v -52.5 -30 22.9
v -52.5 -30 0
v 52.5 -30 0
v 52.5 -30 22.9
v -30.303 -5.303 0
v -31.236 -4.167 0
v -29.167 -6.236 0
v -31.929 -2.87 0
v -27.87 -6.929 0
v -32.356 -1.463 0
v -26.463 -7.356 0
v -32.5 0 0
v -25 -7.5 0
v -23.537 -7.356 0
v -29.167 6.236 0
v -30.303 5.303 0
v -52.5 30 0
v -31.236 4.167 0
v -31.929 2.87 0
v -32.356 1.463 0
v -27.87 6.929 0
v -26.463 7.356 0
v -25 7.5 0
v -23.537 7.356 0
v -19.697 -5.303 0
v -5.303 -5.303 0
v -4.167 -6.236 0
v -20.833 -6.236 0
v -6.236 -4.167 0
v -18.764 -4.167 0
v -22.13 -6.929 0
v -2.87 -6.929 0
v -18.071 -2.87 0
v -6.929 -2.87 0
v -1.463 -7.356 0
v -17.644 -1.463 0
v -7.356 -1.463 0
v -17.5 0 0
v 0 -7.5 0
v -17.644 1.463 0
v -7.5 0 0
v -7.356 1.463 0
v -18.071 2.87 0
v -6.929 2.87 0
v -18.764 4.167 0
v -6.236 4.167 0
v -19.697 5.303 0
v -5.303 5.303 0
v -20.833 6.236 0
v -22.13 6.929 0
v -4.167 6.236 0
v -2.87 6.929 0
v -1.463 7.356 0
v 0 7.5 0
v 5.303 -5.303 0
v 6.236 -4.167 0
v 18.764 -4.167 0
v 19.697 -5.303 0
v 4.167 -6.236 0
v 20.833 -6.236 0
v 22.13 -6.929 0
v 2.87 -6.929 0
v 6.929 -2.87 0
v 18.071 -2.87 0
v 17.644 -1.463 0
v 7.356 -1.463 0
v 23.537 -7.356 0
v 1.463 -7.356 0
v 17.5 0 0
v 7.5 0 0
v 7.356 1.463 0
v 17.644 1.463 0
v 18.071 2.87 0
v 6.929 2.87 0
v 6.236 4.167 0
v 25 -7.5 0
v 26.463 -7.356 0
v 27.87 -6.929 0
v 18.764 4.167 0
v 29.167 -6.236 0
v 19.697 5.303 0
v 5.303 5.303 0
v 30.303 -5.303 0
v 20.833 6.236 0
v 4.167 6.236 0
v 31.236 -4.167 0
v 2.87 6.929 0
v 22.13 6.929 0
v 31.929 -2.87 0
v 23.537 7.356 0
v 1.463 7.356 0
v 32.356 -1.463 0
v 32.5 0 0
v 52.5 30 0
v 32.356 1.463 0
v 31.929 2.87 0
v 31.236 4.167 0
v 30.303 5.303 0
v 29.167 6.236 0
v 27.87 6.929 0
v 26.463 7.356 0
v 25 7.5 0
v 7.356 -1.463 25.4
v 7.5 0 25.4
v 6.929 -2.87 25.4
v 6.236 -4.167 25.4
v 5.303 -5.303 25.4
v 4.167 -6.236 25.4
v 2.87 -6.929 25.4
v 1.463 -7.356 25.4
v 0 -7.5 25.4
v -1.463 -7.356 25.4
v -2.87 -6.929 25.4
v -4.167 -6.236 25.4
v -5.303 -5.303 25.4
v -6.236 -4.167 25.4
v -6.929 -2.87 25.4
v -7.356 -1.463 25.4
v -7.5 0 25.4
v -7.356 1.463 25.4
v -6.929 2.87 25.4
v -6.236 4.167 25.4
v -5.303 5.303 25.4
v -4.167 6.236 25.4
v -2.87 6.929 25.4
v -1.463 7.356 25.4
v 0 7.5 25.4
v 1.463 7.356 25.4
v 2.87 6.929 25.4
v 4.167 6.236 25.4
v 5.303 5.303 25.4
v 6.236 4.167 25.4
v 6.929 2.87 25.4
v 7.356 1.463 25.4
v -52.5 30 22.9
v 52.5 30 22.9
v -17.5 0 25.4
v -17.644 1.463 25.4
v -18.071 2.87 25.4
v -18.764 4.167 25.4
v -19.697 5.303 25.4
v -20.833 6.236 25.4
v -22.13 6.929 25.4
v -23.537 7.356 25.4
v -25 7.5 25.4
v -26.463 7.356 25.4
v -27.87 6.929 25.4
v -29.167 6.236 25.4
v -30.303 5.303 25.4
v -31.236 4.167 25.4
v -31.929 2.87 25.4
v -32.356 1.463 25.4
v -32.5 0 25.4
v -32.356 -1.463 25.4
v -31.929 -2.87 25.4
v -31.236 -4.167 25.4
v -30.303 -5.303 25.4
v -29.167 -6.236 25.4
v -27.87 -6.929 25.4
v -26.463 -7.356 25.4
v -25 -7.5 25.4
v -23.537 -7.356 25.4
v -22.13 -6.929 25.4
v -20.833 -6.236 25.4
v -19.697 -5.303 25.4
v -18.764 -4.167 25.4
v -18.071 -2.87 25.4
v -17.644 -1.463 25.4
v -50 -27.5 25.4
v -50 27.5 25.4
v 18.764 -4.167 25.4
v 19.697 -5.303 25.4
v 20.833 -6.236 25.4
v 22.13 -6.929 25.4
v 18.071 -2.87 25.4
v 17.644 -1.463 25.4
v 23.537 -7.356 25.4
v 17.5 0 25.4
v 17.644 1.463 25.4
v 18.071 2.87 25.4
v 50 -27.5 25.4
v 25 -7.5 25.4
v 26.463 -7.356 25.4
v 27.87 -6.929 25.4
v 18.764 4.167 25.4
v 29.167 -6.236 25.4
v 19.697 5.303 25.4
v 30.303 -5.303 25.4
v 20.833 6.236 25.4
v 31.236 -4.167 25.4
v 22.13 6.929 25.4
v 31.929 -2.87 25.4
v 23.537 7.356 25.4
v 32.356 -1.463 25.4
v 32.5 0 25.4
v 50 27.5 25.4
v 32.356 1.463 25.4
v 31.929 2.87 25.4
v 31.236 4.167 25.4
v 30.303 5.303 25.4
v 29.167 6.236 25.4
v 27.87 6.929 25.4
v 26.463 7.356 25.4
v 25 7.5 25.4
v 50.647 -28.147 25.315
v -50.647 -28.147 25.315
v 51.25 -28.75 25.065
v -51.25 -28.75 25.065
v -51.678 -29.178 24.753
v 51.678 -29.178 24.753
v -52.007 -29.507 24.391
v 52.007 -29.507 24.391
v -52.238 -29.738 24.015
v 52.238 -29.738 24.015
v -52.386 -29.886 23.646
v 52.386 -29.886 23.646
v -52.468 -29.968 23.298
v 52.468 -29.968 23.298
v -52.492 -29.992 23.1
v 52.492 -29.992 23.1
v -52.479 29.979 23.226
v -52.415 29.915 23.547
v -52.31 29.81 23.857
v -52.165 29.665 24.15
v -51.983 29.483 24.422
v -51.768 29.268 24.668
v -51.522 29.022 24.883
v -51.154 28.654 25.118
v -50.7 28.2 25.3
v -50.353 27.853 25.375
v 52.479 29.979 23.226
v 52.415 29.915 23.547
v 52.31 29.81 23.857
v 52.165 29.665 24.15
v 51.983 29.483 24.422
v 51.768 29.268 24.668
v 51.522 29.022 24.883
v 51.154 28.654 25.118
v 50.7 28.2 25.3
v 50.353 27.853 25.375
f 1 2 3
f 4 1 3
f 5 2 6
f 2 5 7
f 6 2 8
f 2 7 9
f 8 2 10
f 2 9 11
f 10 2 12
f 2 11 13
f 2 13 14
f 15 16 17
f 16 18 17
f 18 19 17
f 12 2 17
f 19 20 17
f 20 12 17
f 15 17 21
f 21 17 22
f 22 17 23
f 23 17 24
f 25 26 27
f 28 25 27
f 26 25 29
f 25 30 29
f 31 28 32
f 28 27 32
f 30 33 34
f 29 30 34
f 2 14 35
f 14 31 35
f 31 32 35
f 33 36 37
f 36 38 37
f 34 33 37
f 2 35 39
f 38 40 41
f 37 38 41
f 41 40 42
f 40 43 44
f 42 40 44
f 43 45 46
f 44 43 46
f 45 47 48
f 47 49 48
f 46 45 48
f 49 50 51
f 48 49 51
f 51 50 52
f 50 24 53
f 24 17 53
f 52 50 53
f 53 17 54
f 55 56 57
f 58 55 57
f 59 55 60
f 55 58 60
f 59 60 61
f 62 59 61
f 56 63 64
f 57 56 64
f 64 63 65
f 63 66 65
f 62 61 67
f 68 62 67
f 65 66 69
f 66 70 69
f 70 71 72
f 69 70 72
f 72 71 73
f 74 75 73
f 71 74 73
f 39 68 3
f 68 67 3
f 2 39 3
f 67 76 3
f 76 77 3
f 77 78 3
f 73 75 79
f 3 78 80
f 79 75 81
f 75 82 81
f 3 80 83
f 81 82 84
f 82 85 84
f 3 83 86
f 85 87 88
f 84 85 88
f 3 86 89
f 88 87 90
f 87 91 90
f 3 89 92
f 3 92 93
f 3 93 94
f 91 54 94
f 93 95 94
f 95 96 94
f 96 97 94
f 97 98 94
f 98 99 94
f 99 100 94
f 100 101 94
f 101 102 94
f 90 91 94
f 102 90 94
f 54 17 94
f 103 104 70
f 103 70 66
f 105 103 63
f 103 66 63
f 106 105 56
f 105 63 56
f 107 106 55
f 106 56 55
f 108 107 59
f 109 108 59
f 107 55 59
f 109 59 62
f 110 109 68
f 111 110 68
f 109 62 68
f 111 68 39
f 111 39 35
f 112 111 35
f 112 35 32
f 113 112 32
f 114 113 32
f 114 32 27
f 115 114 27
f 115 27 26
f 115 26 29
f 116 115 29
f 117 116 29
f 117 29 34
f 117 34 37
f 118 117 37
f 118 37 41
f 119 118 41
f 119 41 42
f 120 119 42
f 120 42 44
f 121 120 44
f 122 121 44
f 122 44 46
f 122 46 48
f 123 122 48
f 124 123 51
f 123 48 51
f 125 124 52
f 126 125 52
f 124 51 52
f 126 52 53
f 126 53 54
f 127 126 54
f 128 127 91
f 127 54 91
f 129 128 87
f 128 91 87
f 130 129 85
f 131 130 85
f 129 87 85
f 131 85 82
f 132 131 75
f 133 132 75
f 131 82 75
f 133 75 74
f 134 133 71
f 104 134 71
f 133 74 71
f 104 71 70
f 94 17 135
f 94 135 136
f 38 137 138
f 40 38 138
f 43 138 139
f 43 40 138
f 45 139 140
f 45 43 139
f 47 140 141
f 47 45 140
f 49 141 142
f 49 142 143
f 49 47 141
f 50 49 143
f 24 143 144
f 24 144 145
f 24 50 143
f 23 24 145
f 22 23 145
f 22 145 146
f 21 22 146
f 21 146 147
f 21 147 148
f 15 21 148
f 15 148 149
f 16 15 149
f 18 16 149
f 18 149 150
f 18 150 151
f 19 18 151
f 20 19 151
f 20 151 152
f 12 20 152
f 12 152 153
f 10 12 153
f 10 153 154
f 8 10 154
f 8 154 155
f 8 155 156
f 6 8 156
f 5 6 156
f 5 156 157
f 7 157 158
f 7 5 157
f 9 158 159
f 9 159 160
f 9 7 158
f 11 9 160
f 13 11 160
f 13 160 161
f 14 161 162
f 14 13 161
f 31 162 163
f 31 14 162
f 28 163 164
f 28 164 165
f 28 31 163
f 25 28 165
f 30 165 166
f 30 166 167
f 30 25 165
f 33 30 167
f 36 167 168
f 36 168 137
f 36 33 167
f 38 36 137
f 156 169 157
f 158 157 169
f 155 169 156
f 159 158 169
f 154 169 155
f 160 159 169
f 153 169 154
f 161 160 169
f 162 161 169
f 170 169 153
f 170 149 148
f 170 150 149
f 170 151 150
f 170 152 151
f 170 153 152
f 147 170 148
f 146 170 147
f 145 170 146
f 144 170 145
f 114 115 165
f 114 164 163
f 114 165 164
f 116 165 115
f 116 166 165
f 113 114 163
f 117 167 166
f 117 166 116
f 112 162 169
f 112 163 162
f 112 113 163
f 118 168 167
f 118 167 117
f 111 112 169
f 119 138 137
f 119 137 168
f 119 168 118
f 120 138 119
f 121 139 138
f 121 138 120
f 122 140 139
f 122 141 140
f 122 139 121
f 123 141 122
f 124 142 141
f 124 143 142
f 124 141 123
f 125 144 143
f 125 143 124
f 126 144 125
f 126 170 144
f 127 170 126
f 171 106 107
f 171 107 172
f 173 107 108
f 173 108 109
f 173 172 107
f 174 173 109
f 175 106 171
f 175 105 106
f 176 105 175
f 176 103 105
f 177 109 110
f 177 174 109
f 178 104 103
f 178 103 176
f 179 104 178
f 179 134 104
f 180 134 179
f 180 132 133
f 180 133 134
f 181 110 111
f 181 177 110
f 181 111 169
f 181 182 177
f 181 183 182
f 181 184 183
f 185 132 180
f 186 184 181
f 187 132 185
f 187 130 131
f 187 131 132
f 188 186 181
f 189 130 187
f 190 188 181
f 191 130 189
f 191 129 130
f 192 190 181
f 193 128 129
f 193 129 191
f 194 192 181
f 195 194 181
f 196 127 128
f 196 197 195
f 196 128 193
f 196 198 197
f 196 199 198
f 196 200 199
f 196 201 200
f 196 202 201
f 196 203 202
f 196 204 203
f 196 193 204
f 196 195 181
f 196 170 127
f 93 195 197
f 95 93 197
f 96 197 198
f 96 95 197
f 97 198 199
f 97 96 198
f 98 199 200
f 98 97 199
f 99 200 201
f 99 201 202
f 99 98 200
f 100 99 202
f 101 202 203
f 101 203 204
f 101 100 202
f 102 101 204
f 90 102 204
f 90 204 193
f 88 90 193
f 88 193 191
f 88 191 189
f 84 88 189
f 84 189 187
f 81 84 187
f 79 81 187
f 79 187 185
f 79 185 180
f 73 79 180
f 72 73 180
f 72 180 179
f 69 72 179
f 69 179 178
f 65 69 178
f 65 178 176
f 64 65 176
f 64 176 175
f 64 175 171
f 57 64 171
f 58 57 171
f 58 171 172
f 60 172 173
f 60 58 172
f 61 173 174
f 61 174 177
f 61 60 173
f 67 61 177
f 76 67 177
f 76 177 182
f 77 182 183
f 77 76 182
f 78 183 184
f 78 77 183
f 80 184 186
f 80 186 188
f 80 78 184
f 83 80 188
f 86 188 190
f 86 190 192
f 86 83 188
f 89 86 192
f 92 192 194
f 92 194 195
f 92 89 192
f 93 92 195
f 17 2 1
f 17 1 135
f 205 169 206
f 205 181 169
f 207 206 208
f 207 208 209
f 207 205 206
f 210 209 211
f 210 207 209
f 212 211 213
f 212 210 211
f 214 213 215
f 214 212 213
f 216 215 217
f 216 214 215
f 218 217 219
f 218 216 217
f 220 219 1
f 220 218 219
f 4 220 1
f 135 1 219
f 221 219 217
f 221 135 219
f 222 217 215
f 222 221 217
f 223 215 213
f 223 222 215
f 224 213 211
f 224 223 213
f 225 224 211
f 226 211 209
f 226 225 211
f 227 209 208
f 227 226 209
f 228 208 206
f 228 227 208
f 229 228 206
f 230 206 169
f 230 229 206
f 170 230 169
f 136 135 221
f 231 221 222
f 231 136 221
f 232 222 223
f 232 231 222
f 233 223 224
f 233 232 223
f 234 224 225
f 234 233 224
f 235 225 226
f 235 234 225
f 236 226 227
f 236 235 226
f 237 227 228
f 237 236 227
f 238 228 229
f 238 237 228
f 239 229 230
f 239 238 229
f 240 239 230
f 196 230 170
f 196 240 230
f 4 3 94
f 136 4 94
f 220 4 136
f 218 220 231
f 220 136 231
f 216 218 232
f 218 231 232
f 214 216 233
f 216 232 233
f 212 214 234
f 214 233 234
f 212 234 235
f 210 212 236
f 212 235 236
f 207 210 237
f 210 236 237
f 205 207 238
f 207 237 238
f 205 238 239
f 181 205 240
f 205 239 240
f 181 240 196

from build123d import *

# Parameters (mm, degrees)
F0_W     = 105
F0_H     = 60
F0_R     = 7.5
F1_DEPTH = 20
F2_DEPTH = 25.4
F3_R     = 2.5


with BuildPart() as f1:
    # F0 (on Top) → F1 (new body)
    with BuildSketch(Plane.XY):
        Rectangle(F0_W, F0_H)
        with Locations((-25, 0)):
            Circle(F0_R, mode=Mode.SUBTRACT)
        with BuildLine():
            ThreePointArc((-7.5, 0), (0, 7.5), (7.5, 0))
            ThreePointArc((7.5, 0), (0, -7.5), (-7.5, 0))
        make_face(mode=Mode.SUBTRACT)
        with Locations((25, 0)):
            Circle(F0_R, mode=Mode.SUBTRACT)
    extrude(amount=F1_DEPTH)

    # F0 (on Top) → F2 (join)
    with BuildSketch(Plane.XY):
        Rectangle(F0_W, F0_H)
        with Locations((-25, 0)):
            Circle(F0_R, mode=Mode.SUBTRACT)
        with BuildLine():
            ThreePointArc((-7.5, 0), (0, 7.5), (7.5, 0))
            ThreePointArc((7.5, 0), (0, -7.5), (-7.5, 0))
        make_face(mode=Mode.SUBTRACT)
        with Locations((25, 0)):
            Circle(F0_R, mode=Mode.SUBTRACT)
    extrude(amount=F2_DEPTH)

    # F3
    f3_edges = [f1.edges().sort_by_distance(p)[0] for p in [
        (0, -30, 25.4),
        (-52.5, 0, 25.4),
        (0, 30, 25.4),
        (52.5, 0, 25.4),
    ]]
    fillet(f3_edges, radius=F3_R)


solid = f1.part
